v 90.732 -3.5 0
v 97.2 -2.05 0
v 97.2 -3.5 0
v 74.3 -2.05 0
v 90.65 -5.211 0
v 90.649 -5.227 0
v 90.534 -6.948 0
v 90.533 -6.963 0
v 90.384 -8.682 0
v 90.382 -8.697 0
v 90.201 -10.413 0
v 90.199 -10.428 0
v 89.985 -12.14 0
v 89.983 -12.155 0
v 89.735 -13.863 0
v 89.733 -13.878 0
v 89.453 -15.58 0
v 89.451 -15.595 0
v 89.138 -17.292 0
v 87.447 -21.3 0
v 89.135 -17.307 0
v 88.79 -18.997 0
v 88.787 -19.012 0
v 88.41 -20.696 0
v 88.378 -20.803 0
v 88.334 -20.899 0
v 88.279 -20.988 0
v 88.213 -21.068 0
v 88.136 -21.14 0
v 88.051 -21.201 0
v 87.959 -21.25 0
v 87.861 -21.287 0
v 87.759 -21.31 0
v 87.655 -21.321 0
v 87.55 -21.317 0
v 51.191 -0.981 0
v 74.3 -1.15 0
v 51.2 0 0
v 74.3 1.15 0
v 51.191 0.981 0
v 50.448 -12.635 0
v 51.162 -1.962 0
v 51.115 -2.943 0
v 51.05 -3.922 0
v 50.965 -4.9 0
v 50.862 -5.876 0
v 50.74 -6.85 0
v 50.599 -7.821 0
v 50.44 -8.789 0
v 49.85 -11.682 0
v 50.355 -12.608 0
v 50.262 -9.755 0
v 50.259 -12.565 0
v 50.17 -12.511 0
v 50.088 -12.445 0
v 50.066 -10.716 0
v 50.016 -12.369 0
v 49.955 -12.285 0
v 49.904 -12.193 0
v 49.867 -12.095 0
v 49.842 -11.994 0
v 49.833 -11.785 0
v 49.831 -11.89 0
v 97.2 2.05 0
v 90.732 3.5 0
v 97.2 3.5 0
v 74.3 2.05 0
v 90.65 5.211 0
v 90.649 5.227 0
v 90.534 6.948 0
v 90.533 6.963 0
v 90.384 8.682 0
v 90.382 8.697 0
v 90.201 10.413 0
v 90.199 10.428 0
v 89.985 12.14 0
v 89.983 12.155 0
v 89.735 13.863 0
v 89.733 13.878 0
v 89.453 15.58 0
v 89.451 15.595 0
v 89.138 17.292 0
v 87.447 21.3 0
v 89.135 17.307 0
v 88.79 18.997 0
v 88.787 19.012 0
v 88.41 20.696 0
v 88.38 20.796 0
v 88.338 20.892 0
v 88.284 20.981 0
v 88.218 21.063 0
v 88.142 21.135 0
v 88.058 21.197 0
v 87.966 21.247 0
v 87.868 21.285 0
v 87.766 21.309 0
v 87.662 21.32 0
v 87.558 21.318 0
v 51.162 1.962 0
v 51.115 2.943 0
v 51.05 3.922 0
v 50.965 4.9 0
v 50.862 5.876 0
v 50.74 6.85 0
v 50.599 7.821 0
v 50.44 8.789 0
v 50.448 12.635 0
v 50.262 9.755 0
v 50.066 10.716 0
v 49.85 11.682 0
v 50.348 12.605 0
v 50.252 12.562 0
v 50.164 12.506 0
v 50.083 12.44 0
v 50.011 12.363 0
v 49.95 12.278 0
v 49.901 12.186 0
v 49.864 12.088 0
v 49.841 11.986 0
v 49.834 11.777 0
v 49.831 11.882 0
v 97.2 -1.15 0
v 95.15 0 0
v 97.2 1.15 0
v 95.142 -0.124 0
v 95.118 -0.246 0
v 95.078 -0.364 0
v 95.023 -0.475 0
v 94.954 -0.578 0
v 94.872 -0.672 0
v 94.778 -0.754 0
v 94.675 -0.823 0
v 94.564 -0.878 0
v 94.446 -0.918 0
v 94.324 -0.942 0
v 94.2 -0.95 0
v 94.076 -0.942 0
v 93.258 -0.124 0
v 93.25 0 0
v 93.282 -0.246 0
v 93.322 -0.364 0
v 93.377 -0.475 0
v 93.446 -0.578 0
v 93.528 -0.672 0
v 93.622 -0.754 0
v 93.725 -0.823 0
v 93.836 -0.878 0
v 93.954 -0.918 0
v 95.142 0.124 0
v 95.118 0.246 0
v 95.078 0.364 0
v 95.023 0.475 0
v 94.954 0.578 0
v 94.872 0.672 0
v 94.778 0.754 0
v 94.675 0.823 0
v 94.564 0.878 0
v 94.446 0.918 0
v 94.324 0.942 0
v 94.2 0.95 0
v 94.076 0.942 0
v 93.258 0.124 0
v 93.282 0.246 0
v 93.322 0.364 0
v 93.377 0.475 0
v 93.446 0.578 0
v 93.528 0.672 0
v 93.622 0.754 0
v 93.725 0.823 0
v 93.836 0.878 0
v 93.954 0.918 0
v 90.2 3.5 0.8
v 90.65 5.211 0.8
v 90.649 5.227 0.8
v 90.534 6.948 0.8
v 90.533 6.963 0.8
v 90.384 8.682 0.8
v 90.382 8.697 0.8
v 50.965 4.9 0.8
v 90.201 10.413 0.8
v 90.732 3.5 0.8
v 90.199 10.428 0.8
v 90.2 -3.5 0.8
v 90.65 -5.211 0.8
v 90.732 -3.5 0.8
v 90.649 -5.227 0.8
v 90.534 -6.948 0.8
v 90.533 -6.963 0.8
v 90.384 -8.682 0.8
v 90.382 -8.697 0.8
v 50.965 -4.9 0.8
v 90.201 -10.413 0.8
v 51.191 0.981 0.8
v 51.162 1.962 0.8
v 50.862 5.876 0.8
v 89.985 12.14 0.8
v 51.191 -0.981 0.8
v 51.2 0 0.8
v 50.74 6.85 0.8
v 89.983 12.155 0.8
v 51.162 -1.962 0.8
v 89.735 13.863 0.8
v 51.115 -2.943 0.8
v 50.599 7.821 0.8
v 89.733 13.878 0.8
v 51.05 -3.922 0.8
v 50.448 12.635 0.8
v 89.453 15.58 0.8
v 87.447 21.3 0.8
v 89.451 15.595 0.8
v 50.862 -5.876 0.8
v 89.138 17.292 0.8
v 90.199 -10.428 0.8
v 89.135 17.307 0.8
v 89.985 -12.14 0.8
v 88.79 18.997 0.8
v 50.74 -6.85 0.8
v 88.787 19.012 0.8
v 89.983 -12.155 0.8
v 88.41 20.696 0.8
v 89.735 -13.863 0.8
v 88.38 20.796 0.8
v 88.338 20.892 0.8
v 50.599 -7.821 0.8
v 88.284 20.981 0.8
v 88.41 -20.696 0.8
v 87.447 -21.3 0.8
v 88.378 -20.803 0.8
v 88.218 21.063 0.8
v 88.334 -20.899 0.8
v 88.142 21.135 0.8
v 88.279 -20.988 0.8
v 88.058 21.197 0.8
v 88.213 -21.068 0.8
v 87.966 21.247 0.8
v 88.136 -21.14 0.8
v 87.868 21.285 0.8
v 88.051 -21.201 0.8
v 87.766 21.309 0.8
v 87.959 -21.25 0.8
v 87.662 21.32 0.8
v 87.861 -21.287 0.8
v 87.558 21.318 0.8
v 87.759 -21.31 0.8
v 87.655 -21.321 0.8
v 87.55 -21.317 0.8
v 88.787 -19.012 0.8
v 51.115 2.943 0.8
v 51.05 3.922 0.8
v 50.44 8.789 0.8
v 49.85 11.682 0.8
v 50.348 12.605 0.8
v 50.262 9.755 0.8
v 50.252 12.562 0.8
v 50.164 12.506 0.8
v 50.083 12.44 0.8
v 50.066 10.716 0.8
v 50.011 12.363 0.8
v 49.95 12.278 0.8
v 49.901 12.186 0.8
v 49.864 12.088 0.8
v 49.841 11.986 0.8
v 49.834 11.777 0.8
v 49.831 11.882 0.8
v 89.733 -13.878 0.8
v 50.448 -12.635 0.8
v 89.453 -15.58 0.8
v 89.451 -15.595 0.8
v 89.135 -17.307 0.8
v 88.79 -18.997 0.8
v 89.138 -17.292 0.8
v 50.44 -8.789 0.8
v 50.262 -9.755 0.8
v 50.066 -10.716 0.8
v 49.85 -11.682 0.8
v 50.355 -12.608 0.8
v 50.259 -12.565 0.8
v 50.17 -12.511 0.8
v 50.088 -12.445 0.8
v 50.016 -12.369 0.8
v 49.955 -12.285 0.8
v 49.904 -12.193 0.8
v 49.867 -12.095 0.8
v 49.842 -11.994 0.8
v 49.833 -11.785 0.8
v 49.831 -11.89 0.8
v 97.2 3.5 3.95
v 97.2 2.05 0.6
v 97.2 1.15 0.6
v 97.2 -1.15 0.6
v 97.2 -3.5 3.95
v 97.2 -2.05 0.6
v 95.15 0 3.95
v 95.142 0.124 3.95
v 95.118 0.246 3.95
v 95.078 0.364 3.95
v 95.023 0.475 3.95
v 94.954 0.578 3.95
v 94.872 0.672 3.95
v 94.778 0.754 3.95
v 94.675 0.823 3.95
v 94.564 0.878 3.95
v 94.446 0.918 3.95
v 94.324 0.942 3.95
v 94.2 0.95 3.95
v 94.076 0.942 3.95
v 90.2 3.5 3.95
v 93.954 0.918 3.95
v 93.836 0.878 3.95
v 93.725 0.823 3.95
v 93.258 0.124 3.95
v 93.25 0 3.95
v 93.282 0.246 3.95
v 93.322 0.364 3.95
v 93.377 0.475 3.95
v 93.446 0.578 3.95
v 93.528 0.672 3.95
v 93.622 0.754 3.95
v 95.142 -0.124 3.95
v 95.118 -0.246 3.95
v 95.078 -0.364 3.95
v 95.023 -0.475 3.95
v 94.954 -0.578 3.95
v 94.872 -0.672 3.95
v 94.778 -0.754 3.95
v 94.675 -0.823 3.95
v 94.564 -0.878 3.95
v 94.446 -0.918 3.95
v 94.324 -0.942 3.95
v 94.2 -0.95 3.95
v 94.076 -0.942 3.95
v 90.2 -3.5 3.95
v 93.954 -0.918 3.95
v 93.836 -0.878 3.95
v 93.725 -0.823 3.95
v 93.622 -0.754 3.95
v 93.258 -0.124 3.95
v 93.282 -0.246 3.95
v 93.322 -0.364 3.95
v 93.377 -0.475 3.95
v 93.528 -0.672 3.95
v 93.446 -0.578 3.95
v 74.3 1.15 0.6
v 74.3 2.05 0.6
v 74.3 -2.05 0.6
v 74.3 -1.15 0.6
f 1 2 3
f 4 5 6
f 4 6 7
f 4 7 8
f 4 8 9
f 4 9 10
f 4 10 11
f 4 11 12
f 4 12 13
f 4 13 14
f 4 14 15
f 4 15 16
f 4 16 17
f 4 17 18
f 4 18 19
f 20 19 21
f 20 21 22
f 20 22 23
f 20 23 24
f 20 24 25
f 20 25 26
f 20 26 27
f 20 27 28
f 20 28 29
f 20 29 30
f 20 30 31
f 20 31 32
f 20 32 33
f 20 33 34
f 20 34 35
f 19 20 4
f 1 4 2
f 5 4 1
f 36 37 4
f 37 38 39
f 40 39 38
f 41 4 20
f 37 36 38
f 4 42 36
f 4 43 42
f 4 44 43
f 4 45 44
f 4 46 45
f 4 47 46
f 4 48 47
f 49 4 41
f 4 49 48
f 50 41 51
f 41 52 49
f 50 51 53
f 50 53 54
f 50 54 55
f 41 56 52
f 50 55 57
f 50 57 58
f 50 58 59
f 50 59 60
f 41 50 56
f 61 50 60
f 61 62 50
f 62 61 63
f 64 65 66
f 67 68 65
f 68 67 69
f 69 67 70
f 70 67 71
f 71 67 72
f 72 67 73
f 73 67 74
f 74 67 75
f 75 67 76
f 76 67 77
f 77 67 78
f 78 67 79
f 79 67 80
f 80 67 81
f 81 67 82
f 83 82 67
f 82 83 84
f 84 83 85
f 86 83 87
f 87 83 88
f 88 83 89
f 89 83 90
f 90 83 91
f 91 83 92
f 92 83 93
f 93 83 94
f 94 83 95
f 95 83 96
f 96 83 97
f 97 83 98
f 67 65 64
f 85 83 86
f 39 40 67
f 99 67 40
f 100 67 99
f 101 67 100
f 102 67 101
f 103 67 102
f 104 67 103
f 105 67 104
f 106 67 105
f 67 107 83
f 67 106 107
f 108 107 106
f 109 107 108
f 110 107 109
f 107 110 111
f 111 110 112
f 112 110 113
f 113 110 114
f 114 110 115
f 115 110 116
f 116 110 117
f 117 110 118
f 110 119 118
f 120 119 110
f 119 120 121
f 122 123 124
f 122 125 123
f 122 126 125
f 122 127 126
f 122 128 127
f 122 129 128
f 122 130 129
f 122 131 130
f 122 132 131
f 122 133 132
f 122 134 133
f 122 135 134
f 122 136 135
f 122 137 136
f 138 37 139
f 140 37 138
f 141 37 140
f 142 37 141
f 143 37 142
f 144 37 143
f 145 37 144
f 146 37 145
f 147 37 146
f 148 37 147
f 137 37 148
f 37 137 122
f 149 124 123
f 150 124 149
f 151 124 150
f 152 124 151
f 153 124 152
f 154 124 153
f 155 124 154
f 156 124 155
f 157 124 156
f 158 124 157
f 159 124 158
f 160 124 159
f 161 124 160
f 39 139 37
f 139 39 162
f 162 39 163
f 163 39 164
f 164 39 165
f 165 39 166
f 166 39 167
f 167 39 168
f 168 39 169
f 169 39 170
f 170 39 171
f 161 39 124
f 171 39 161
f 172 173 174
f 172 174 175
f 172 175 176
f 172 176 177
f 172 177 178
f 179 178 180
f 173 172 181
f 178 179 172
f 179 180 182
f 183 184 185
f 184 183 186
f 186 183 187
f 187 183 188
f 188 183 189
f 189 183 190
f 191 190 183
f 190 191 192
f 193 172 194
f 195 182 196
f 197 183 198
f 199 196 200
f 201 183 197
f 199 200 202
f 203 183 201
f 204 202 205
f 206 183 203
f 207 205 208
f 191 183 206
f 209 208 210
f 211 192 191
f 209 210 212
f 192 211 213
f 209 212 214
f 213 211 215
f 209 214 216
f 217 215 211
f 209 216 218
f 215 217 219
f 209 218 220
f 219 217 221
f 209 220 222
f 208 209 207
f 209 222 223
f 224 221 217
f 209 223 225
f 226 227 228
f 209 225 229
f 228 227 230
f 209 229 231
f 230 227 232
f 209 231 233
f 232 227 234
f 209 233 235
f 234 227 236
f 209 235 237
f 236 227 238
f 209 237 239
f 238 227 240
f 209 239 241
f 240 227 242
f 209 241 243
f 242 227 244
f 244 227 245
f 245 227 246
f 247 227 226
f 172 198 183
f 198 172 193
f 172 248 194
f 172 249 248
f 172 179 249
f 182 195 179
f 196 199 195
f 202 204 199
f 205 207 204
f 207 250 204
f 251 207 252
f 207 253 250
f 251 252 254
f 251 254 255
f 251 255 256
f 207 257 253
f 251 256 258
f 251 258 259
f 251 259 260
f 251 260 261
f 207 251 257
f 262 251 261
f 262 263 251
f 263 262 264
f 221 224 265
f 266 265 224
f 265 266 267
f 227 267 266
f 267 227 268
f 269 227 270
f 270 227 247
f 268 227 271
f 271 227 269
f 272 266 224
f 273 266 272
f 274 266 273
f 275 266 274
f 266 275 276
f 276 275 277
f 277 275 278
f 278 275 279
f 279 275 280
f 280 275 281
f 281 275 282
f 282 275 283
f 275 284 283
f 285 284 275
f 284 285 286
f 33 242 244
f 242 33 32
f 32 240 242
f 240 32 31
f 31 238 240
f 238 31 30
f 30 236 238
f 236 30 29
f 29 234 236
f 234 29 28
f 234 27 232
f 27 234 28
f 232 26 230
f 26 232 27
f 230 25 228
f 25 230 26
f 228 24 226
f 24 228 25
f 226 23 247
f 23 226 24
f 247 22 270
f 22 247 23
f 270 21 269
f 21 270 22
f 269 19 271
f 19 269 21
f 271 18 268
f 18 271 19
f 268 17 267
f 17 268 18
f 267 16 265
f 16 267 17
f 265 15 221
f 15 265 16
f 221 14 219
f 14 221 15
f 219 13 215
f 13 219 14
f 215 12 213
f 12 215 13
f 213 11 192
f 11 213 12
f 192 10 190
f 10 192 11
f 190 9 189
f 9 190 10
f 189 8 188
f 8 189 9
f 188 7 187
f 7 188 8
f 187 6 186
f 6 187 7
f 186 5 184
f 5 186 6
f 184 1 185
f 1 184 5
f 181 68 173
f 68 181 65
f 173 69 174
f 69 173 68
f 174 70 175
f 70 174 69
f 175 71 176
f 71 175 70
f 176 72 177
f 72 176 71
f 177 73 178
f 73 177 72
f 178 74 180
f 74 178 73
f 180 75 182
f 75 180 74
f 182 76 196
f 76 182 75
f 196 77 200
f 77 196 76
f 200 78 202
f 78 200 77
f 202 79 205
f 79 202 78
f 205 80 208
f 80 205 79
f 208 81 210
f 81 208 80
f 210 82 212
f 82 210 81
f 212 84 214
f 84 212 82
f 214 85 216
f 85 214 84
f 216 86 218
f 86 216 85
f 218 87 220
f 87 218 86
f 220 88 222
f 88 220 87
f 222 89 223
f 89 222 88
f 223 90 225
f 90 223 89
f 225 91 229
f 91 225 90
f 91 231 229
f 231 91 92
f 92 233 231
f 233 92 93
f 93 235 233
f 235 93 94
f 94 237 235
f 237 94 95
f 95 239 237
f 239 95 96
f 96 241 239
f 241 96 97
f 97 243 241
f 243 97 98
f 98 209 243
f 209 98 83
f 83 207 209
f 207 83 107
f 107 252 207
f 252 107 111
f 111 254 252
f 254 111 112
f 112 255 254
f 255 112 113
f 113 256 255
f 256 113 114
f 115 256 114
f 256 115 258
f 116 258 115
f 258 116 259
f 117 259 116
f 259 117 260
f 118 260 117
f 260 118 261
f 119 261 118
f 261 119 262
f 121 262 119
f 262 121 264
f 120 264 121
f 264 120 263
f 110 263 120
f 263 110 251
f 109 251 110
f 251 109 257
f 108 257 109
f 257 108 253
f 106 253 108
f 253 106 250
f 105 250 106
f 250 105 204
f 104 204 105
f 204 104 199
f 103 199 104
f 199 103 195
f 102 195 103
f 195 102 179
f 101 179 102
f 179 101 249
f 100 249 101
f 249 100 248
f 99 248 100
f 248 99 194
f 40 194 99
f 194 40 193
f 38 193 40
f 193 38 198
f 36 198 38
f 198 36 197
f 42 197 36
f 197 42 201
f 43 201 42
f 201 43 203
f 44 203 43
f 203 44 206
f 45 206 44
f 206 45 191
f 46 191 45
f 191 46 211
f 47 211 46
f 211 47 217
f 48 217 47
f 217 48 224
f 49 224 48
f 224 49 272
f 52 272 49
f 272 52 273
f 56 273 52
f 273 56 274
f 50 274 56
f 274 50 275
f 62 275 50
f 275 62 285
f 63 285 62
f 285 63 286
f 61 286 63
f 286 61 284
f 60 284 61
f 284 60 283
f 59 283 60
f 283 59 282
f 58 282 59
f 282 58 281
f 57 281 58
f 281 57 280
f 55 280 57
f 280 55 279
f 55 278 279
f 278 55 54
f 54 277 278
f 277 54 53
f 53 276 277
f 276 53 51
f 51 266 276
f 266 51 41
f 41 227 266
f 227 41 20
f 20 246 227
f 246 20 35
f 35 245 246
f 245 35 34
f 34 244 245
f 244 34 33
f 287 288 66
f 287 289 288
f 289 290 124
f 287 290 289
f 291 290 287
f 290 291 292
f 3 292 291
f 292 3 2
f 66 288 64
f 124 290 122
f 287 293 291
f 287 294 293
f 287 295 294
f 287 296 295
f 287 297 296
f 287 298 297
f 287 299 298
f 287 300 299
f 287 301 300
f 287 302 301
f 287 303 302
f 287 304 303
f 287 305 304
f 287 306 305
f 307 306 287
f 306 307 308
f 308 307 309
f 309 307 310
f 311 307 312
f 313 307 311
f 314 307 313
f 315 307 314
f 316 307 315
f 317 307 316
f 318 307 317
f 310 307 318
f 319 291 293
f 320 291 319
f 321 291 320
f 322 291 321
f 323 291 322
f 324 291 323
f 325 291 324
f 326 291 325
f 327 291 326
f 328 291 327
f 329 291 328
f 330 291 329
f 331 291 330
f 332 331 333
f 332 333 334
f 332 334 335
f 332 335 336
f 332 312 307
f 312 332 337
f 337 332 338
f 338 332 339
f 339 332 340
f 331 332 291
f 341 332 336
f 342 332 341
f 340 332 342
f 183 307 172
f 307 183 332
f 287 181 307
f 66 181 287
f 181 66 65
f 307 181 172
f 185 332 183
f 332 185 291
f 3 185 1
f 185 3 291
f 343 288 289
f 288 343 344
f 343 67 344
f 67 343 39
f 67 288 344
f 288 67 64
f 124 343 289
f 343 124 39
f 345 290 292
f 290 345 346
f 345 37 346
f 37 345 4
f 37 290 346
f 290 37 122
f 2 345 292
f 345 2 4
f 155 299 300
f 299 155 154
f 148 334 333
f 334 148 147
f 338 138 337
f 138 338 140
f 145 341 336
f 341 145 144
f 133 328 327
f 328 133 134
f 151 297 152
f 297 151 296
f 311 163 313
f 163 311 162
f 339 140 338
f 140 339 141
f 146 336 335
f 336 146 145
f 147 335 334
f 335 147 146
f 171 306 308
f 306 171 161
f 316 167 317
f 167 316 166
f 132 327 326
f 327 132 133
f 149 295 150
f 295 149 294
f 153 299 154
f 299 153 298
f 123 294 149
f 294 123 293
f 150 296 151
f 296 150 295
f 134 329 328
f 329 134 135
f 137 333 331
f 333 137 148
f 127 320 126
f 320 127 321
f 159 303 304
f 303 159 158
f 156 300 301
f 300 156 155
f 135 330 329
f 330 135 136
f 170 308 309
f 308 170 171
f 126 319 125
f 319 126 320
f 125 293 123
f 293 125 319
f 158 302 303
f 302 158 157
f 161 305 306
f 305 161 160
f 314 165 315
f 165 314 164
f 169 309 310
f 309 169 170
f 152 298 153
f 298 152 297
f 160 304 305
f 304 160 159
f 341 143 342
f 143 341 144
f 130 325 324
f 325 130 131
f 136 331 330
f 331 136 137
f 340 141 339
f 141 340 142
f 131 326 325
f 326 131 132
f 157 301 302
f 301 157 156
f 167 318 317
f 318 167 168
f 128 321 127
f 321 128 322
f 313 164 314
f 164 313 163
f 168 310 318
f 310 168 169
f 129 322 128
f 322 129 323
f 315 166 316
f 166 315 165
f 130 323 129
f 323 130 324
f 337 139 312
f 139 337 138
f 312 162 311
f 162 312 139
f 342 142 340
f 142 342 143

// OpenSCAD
// file: parameters.scad
// =============================================================================
// Gen-CC — nightly 2026-10-13 (physics_scorer, honest magpylib watts)
// Stator-only upgrade for an existing Gen-BX: the R71 rotors and Ø168 steel stay as they are; a new annular 12-bobbin stator with 6.3 mm copper (magnet gap 9.35 → 8.90 mm) and longer r52–90 bobbins (the open-centre stator now packs one size up) replaces the old one, together with a shorter gap sleeve, frame rods moved out to R93.5 and new bearing bridges. No new magnets or steel.
// Clocking 0 deg (magnets N facing S) + D-flat keyed bore + index notch + flip-symmetric hole map.
// Windable 2-piece bobbin; turns = physics_scorer turns_fit; copper only between flanges.
// Steel back-iron: 2× Ø168 × 4.76 mm (3/16") mild-steel discs (steel_backiron_disc.dxf); magnets sit ON the steel
// (through-pockets) -> score with --back-iron. Night 2026-10-13.
// =============================================================================
topology            = "dual_rotor";

// --- Wire / winding (physics_scorer winding-fit) -------------------------------
wire_awg            = 26;
wire_od             = 0.45;     // insulated OD mm (bare 0.405)
fill_realistic      = 0.65;     // insulated-wire area / window (DENSE layered wind with a jig; scorer cap 0.65)
turns               = 391;       // = physics_scorer turns_fit (do NOT raise)
coil_former_type    = "bobbin";
coil_core_inset     = 15.20;     // radial copper build: hub = copper boundary inset by this
wind_build_axial    = 0.0;      // nothing proud of the flanges
wind_build_radial   = 0.0;

// --- Bobbin (base + lid) ---------------------------------------------------------
coil_id_r           = 52.00;    // copper boundary sector
coil_od_r           = 90.00;
span_deg            = 26.36;    // = pitch - 2*asin((wall+0.85)/coil_id_r) -> >=1.2 mm stator web
former_web          = 6.30;     // copper height between flanges (TALL copper: steel keeps Bz up)
flange_t            = 0.80;     // >= 0.8 mm FDM wall rule (tall winds push on the flanges)
wall                = 0.80;     // flange lip beyond copper
former_bare_h       = former_web + 2 * flange_t;
coil_envelope_h     = former_bare_h + 2 * wind_build_axial;
tab_w               = 7.0;
tab_len             = 7.0;
tab_h               = former_bare_h / 2;
pin_d               = 1.9;      // 1.75 mm filament locating pin
coil_mount_r        = coil_od_r + 0.2 + 4.0;
lead_y              = 1.6;
lead_slot_w         = 0.9;
lead_groove_d       = 0.6;

// --- Gap -------------------------------------------------------------------------
run_clear           = 0.50;     // rotor face -> flange
gap_spacer_h        = run_clear + wind_build_axial;
m2m                 = coil_envelope_h + 2 * run_clear;   // rotor face to rotor face (= gap_sleeve length)

// --- Stator ----------------------------------------------------------------------
coil_stations       = 12;
bay_clear           = 0.25;
stator_thick        = former_bare_h;                        // bobbins flush both faces
stator_od           = 198;
shaft_clear_stator  = 14.0;     // stator is static; gap sleeve OD 12 spins inside
stator_ir           = 46.95;    // ANNULAR stator: open centre (nested one-plate pack); inner rim 4.0 mm

// --- Rotor(s) --------------------------------------------------------------------
magnet_Br           = 1.43;     // N52
magnet_d_large      = 20.0;
magnet_h_large      = 5.0;      // one O20x5 per pocket
magnet_h_small      = 5.0;      // unused: no O5 pockets in this kit
halbach_magnetisation = "none";  // NO O5 assist magnets in this kit (scan: they lower the 4-pole score)
rotor_b_same_axis   = true;     // same-index magnets share one axis: N faces S across the gap
large_pocket_d      = 20.3;
small_pocket_d      = 5.3;
pocket_h            = 5.00;     // THROUGH the carrier: magnet back face sits on the steel disc (FLUSH seat: carrier = magnet height, magnet face level with the rotor face)
large_n             = 8;
R_large             = 71.0;
small_r_list        = [];       // no O5 pockets
carrier_od          = 168.0;
carrier_thick       = pocket_h;
hub_h               = 12.0;     // > steel_t + insert: radial set-screw clears the steel
hub_od              = 24.0;     // slim hub so the M4 brace rods fit at R~18 inside the coil ring
hub_insert_d        = 4.0;      // M3 heat-set insert, radial, bears on the D-flat
rotor_b_offset_deg  = 0.0;      // CLOCKING: magnets directly opposite
shaft_key           = "dflat";
dflat_depth         = 0.5;      // 8 mm shaft with 0.5 mm flat (7.5 across flat)
index_notch_d       = 3.0;

// --- Steel back-iron (buyable laser-cut) -------------------------------------------
steel_t             = 4.76;      // mild steel thickness (image method ignores it; sized from steel_flux.py so the return path stays well below saturation)
steel_center_hole   = 26.0;     // slips over the rotor hub (OD 24)
steel_od            = carrier_od;   // steel disc OD = rotor carrier OD

// --- Modular MAX interface ----------------------------------------------------------
shaft_bore          = 8.35;
dflat_x             = 4.0 - dflat_depth + (shaft_bore - 8.0) / 2;
bearing_d           = 21.85;
bearing_h           = 7.2;
m3_clear            = 3.5;
bolt_r_inner        = 30.0;     // M3 steel-disc clamp bolts (inside the magnet ring)
bolt_n_inner        = 4;
bolt_inner_angles   = [0, 90, 180, 270];
bolt_r_outer        = 44.0;     // second M3 steel-disc clamp ring
bolt_outer_angles   = [67.5, 112.5, 247.5, 292.5];
flange_bolt_r       = 93.5;     // frame rods: OUTSIDE the rotor OD (rotors spin inside them)
flange_bolt_n       = 4;
flange_bolt_offset  = 45.00;    // between coil stations -> never cuts a lead groove/tab
brace_r             = 18.0;
brace_d             = 4.3;      // temporary M4 jack rods (assembly only)
brace_n             = 4;
brace_angles        = [45, 135, 225, 315];          // flip-symmetric

spacer_pad_od       = 14.0;
spacer_pad_id       = m3_clear;
endbell_od          = 197.0;
endbell_thick       = 8.0;
endbell_shaft_clear = 10.0;
collar_h            = 10.0;
standoff_od         = 9.0;
frame_standoff_h    = run_clear + carrier_thick + hub_h + collar_h + 2.0;
sleeve_od           = 12.0;
plate_max_mm        = 410;

$fn = 64;
// main file
// Gen-CC — bobbin LID (top flange + locating tab). Print x12, flange face DOWN on the bed.
// CA-glue onto the hub top BEFORE winding. Tab = lap joint into the stator tab pocket; 1.75 mm filament
// pin through pin hole + stator ledge, trim flush. Lead slots carry both leads flush.
include <parameters.scad>;
$fn = 48;
module sector_2d(r_in, r_out, ang) {
    polygon([
        for (a = [-ang/2 : ang/24 : ang/2]) [r_in*cos(a), r_in*sin(a)],
        for (a = [ang/2 : -ang/24 : -ang/2]) [r_out*cos(a), r_out*sin(a)]
    ]);
}
module footprint_2d() { offset(r=wall) sector_2d(coil_id_r, coil_od_r, span_deg); }
module hub_2d()       { offset(delta=-coil_core_inset) sector_2d(coil_id_r, coil_od_r, span_deg); }

difference() {
    union() {
        linear_extrude(flange_t) footprint_2d();
        translate([coil_od_r + 0.2, -tab_w/2, 0]) cube([tab_len, tab_w, tab_h]);
    }
    translate([coil_mount_r, 0, -0.1]) cylinder(d=pin_d, h=tab_h + 1);
    for (y = [lead_y, -lead_y])
        translate([coil_od_r - coil_core_inset - 0.5, y - lead_slot_w/2, -0.1])
            cube([coil_core_inset + tab_len + 2, lead_slot_w, lead_groove_d + 0.1]);
}
